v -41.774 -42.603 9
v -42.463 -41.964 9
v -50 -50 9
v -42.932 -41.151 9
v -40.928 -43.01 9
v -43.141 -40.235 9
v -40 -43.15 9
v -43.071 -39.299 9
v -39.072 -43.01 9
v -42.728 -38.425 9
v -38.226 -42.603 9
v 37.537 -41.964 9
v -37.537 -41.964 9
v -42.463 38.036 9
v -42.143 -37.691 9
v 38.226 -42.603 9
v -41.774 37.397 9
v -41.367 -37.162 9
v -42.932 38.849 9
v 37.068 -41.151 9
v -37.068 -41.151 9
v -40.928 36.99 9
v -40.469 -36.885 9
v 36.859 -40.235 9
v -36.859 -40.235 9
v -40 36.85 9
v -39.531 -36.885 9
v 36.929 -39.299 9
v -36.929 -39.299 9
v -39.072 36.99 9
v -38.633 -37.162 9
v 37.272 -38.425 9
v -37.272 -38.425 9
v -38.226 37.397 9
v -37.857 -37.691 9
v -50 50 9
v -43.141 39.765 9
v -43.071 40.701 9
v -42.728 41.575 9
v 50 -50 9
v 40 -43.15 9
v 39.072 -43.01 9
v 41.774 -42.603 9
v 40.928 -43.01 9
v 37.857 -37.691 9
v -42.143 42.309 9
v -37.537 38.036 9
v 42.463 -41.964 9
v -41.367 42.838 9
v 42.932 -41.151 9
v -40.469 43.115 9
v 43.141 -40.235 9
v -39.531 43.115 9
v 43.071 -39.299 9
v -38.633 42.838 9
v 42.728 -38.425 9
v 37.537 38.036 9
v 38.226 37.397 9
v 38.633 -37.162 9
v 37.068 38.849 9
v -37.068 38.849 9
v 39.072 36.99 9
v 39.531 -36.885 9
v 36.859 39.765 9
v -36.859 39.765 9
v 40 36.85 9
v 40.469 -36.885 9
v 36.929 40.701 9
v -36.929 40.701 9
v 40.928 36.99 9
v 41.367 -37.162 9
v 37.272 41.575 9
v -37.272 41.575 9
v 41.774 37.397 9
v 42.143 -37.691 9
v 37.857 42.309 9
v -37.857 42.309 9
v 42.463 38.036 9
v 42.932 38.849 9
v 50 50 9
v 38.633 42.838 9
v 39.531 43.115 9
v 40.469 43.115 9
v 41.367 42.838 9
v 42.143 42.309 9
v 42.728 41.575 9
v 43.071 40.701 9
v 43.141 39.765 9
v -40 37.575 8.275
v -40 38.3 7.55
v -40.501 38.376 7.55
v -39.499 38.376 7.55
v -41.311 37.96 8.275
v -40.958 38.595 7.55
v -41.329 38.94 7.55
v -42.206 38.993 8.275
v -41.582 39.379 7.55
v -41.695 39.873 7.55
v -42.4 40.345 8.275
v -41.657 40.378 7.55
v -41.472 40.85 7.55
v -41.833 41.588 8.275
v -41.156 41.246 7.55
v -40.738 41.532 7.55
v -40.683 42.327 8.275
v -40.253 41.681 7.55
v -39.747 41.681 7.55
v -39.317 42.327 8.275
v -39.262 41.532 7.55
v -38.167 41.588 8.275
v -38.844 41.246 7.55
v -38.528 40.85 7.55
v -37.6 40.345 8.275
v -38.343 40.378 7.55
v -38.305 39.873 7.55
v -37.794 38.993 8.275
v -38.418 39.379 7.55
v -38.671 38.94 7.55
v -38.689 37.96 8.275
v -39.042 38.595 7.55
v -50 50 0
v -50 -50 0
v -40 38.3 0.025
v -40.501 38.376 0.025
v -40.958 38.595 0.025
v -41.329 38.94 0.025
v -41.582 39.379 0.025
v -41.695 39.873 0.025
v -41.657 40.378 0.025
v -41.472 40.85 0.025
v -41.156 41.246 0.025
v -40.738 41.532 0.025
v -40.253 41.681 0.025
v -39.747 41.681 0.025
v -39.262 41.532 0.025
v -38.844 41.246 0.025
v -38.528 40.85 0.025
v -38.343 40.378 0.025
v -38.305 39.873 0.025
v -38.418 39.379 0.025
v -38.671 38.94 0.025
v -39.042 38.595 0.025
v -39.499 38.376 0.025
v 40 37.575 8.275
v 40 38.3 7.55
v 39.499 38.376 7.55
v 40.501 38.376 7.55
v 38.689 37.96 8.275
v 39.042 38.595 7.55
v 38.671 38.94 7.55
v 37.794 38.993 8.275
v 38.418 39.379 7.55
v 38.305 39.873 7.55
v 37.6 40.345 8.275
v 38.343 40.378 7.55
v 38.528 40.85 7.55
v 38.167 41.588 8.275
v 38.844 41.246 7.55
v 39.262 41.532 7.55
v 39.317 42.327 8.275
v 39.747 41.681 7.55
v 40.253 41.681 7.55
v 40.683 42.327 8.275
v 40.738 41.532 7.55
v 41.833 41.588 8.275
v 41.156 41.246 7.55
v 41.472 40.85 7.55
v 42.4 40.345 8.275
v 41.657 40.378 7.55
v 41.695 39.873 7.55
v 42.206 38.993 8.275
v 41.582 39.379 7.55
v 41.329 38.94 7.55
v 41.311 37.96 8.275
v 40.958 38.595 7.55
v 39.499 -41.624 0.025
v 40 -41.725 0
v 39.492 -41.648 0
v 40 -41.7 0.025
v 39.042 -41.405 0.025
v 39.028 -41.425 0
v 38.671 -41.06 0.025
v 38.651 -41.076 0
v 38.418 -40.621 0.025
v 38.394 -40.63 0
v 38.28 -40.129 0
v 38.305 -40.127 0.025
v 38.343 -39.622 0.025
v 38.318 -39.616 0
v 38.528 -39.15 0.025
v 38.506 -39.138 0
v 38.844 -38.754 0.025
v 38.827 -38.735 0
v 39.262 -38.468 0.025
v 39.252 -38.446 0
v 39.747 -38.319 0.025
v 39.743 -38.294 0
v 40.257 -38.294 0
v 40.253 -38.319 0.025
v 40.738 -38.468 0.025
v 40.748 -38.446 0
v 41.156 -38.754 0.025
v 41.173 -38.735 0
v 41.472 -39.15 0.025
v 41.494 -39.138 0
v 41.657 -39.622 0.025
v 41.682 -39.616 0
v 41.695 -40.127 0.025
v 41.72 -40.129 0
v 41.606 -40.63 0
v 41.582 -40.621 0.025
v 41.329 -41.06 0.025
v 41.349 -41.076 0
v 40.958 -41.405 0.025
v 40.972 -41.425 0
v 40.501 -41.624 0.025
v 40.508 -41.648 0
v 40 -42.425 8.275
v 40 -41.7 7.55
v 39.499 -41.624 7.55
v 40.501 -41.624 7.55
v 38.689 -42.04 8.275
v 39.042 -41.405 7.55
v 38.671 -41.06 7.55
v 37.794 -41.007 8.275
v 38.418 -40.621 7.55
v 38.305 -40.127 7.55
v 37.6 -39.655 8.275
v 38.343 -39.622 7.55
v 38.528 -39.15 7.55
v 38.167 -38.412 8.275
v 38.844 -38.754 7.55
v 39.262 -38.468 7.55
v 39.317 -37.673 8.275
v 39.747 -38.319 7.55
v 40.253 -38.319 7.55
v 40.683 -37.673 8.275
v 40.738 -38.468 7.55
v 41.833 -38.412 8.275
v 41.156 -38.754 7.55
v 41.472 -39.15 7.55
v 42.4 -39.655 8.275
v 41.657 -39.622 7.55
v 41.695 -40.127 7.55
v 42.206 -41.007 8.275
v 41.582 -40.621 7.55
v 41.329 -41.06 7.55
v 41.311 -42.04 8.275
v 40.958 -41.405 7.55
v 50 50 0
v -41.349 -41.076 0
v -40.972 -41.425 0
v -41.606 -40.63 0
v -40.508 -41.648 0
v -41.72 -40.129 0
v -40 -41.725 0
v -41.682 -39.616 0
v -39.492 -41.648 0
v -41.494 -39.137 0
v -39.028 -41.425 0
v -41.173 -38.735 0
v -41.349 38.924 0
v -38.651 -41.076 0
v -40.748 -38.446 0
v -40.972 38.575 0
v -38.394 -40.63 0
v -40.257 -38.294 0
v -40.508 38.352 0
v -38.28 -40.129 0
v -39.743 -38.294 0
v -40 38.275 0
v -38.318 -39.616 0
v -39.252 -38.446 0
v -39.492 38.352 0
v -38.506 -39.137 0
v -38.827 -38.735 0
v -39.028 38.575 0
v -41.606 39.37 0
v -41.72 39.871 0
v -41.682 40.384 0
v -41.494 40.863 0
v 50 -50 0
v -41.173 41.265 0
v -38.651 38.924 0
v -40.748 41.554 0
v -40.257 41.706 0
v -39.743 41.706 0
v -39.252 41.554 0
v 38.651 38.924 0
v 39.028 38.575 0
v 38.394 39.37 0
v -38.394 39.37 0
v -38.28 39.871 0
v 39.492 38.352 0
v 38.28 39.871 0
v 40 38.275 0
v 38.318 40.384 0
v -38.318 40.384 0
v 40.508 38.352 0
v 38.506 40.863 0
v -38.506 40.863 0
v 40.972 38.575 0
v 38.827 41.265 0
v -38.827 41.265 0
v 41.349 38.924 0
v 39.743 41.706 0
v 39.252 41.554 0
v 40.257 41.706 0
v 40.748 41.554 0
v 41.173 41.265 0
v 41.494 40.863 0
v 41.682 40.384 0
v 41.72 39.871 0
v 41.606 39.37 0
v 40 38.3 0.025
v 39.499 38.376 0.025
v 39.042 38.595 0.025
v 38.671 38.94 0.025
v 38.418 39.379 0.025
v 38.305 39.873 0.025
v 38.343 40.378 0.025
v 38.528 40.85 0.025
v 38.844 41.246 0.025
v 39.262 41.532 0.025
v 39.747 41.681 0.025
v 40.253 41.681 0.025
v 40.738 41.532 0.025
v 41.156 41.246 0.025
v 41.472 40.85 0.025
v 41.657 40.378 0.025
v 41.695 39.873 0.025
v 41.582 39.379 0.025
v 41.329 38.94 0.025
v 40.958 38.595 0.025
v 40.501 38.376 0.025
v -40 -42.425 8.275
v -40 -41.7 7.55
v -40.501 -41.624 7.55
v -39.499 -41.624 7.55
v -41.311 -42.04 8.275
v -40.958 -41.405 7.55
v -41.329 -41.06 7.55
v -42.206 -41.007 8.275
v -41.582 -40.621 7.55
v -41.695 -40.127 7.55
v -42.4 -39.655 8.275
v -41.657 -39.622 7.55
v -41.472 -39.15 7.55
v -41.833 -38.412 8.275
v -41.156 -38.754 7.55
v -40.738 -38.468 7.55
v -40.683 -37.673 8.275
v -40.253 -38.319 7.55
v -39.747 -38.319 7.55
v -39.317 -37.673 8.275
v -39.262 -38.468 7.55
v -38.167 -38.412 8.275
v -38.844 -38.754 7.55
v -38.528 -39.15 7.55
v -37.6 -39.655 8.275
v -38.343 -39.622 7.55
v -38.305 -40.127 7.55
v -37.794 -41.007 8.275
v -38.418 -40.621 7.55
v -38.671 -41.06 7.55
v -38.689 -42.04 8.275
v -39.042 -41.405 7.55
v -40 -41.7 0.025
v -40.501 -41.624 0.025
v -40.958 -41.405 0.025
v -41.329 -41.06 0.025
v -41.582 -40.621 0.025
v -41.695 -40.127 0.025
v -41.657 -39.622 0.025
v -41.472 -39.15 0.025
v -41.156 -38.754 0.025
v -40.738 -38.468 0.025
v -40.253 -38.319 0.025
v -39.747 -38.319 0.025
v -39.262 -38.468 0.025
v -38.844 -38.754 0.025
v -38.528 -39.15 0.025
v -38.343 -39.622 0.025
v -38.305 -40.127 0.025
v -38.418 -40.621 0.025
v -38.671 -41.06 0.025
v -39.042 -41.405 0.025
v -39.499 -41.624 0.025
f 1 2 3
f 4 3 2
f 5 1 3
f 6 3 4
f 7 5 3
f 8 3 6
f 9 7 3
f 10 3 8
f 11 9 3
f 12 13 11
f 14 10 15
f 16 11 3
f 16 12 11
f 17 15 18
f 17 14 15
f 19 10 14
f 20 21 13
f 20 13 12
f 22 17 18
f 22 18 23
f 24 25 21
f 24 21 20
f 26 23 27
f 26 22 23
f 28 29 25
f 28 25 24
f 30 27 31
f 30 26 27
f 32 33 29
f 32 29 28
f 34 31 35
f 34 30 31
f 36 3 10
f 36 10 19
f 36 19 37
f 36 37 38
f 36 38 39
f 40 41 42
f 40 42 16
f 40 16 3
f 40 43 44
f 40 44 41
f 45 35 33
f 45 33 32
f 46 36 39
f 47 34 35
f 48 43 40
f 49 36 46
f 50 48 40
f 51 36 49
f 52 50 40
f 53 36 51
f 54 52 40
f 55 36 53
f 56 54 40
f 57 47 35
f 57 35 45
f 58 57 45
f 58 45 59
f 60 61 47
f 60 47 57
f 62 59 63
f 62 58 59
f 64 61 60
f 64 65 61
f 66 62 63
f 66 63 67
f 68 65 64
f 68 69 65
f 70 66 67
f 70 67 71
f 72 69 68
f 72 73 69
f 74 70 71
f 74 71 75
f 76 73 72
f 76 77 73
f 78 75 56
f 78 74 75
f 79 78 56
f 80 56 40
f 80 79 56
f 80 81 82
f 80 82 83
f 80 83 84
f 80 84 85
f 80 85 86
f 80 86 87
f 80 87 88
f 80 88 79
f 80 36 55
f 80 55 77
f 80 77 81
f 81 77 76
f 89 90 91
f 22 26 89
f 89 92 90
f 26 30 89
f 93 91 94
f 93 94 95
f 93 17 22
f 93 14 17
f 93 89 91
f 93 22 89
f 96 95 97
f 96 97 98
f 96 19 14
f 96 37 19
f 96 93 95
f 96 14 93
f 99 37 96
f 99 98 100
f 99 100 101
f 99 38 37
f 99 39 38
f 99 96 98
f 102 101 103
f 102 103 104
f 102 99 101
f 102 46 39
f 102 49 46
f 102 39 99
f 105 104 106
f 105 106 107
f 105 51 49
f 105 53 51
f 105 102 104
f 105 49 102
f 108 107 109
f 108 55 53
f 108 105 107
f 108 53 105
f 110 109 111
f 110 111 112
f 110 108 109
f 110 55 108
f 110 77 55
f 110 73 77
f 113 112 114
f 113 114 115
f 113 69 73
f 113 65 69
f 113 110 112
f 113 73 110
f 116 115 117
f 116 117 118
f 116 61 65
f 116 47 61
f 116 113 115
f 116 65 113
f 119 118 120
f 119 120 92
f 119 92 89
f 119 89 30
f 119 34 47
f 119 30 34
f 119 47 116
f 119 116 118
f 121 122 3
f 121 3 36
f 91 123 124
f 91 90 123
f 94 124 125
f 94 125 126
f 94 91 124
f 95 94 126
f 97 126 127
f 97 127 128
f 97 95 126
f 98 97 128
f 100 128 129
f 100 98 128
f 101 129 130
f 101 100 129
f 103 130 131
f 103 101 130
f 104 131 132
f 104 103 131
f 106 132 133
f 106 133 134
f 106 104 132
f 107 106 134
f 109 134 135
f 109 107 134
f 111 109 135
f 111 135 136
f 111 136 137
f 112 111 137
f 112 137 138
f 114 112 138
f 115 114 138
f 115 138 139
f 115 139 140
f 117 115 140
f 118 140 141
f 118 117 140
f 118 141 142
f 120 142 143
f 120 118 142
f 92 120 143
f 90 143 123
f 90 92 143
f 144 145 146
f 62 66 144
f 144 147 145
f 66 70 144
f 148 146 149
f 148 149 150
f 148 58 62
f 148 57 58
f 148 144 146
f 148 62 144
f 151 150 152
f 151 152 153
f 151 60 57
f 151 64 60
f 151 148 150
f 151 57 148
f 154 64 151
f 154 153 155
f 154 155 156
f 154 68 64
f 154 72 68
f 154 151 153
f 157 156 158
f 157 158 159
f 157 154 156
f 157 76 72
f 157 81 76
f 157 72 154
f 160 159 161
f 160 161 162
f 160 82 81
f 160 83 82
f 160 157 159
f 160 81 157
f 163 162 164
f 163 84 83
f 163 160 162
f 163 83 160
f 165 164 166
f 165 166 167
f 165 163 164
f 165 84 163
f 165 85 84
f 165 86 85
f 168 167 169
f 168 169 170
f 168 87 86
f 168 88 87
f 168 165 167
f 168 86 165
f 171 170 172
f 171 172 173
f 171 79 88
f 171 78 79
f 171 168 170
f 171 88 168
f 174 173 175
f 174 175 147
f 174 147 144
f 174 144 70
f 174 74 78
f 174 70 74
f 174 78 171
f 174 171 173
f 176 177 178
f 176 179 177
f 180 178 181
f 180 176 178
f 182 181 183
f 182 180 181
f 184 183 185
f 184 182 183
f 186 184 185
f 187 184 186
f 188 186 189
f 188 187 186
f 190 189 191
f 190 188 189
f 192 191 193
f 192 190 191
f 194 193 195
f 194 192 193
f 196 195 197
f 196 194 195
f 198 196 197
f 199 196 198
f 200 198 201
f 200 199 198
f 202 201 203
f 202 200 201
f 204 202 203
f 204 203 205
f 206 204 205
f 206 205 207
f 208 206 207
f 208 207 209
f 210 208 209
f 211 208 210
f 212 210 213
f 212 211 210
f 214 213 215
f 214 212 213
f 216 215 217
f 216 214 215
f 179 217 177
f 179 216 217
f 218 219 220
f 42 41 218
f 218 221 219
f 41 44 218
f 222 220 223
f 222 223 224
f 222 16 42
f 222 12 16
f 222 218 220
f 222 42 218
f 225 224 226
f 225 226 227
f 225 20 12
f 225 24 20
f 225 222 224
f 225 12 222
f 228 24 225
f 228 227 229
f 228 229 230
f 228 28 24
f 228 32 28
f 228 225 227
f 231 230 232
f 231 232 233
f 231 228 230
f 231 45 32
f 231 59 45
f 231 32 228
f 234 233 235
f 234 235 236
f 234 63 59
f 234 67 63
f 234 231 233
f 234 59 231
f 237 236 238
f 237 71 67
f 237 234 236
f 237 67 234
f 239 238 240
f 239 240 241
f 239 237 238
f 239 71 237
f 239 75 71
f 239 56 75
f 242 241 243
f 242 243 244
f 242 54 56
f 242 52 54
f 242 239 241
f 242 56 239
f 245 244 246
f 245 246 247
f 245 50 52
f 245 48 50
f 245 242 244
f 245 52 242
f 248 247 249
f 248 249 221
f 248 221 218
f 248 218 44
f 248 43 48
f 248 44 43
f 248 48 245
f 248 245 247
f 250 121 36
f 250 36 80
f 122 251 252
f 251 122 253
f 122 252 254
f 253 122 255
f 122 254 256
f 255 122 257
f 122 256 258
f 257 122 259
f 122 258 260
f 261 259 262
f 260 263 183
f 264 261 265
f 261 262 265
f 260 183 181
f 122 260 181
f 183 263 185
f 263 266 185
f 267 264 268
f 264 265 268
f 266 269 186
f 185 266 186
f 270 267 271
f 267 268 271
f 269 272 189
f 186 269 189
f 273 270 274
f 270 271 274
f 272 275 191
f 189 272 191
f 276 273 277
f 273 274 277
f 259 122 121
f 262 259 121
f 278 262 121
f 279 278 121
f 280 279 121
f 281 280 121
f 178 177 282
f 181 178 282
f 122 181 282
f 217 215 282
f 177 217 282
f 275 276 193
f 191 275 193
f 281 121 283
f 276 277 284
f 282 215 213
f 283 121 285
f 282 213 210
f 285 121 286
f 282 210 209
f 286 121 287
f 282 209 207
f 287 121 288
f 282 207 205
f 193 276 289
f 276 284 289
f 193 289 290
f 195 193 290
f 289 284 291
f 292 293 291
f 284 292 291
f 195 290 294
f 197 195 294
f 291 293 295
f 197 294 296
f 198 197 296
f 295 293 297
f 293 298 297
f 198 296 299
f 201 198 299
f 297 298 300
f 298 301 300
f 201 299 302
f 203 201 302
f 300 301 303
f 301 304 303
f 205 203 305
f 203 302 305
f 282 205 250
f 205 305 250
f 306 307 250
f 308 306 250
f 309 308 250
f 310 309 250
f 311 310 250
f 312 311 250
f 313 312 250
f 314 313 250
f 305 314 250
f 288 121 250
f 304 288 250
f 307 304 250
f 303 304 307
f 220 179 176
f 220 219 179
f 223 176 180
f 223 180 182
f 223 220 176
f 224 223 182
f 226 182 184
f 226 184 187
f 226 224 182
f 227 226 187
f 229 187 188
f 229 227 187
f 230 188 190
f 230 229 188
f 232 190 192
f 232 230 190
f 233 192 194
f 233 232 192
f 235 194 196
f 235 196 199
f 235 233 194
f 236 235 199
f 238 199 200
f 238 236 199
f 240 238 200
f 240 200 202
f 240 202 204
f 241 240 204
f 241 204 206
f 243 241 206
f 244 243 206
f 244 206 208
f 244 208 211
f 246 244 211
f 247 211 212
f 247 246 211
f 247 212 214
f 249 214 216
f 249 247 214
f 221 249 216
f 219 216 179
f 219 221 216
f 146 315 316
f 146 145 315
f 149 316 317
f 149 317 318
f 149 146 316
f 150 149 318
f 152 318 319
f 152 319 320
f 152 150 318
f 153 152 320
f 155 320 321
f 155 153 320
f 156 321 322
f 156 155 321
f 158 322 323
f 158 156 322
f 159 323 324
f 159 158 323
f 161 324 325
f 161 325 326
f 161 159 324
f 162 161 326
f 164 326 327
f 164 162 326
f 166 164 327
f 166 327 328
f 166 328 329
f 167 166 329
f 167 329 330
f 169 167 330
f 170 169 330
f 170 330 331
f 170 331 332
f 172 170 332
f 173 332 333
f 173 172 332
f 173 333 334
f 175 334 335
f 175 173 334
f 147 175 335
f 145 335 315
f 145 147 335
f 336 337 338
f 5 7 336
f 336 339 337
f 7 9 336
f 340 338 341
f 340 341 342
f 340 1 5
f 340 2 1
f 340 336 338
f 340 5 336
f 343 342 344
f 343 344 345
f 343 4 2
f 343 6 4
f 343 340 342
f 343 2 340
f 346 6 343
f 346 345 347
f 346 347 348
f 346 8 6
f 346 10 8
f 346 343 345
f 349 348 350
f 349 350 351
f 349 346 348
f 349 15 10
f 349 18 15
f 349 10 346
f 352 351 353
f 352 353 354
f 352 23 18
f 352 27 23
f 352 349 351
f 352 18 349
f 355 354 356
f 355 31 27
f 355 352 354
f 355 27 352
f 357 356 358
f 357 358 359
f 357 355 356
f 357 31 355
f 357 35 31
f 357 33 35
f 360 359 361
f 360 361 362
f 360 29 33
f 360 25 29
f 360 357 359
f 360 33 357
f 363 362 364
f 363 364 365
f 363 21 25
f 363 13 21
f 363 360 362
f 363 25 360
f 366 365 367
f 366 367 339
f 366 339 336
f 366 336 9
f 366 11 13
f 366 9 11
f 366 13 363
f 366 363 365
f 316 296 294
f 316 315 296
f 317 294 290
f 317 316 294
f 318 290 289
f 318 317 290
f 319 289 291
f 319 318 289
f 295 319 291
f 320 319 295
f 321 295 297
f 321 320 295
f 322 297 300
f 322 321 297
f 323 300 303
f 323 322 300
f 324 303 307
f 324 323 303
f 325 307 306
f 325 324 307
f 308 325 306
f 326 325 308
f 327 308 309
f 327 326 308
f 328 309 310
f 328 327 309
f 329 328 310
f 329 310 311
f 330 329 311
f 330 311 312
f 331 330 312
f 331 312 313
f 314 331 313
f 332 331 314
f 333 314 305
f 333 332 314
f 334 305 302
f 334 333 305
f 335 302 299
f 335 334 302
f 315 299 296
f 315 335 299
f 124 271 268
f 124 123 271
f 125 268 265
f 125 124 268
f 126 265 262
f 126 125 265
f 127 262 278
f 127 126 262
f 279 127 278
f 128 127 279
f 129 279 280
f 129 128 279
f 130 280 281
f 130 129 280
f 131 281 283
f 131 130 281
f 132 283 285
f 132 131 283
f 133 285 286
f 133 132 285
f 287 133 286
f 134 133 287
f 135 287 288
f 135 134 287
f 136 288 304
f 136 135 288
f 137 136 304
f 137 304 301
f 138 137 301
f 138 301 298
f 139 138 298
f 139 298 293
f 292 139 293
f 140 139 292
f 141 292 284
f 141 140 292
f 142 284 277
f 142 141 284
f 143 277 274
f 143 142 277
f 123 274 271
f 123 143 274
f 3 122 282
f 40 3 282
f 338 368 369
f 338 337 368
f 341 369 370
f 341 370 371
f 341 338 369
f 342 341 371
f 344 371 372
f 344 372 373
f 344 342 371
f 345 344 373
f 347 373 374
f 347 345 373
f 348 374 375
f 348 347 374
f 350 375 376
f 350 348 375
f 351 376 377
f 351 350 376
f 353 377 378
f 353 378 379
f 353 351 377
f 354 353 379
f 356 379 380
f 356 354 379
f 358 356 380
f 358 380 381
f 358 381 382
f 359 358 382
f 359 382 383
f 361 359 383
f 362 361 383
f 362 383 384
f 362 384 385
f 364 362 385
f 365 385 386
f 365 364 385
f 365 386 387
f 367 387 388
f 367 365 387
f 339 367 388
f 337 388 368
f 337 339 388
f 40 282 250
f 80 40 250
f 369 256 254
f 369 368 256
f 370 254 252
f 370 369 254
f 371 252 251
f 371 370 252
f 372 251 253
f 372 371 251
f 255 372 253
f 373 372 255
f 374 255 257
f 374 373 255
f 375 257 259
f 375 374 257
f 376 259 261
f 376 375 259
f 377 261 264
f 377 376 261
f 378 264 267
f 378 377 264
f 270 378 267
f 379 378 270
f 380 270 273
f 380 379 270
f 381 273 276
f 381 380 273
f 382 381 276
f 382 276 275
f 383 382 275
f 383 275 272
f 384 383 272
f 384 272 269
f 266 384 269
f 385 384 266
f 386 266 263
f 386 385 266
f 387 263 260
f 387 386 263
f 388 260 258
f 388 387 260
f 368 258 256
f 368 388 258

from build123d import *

# Parameters (mm, degrees)
SKETCH_1_W                  = 100
SKETCH_1_H                  = 100
EXTRUDE_1_DEPTH             = 9
HOLE_WIZARD_M3_1_AT_2_COUNT = 2
HOLE_WIZARD_M3_1_AT_2_PITCH = 80
HOLE_WIZARD_M3_1_AT_3_COUNT = 2
HOLE_WIZARD_M3_1_AT_3_PITCH = 113.13708499
HOLE_WIZARD_M3_1_AT_4_COUNT = 2
HOLE_WIZARD_M3_1_AT_4_PITCH = 80


with BuildPart() as part:
    # 草圖1 → 填料-伸長1 (new body)
    with BuildSketch(Plane.XY):
        Rectangle(SKETCH_1_W, SKETCH_1_H)
    extrude(amount=EXTRUDE_1_DEPTH)

    # 草圖4 → M3 平頭機械螺釘的錐孔1 (revolve, cut)
    with BuildSketch(Plane(origin=(-40, 40, 9), x_dir=(0, -1, 0), z_dir=(1, 0, 0))):
        Polygon((0, 0), (0, 9), (1.725, 9), (1.7, 8.975), (1.7, 1.45), (3.15, 0), align=None)
    hole_wizard_m3_1 = revolve(axis=Axis((-40, 40, 15.35), (0, 0, -1)), mode=Mode.SUBTRACT)

    # M3 平頭機械螺釘的錐孔1 at 2: M3 平頭機械螺釘的錐孔1 ×2
    with Locations(*[(i * HOLE_WIZARD_M3_1_AT_2_PITCH, 0, 0) for i in range(1, HOLE_WIZARD_M3_1_AT_2_COUNT)]):
        add(hole_wizard_m3_1, mode=Mode.SUBTRACT)

    # M3 平頭機械螺釘的錐孔1 at 3: M3 平頭機械螺釘的錐孔1 ×2
    with Locations(*[Vector(0.7071067811865476, -0.7071067811865476, 0) * (i * HOLE_WIZARD_M3_1_AT_3_PITCH) for i in range(1, HOLE_WIZARD_M3_1_AT_3_COUNT)]):
        add(hole_wizard_m3_1, mode=Mode.SUBTRACT)

    # M3 平頭機械螺釘的錐孔1 at 4: M3 平頭機械螺釘的錐孔1 ×2
    with Locations(*[(0, -i * HOLE_WIZARD_M3_1_AT_4_PITCH, 0) for i in range(1, HOLE_WIZARD_M3_1_AT_4_COUNT)]):
        add(hole_wizard_m3_1, mode=Mode.SUBTRACT)


solid = part.part
